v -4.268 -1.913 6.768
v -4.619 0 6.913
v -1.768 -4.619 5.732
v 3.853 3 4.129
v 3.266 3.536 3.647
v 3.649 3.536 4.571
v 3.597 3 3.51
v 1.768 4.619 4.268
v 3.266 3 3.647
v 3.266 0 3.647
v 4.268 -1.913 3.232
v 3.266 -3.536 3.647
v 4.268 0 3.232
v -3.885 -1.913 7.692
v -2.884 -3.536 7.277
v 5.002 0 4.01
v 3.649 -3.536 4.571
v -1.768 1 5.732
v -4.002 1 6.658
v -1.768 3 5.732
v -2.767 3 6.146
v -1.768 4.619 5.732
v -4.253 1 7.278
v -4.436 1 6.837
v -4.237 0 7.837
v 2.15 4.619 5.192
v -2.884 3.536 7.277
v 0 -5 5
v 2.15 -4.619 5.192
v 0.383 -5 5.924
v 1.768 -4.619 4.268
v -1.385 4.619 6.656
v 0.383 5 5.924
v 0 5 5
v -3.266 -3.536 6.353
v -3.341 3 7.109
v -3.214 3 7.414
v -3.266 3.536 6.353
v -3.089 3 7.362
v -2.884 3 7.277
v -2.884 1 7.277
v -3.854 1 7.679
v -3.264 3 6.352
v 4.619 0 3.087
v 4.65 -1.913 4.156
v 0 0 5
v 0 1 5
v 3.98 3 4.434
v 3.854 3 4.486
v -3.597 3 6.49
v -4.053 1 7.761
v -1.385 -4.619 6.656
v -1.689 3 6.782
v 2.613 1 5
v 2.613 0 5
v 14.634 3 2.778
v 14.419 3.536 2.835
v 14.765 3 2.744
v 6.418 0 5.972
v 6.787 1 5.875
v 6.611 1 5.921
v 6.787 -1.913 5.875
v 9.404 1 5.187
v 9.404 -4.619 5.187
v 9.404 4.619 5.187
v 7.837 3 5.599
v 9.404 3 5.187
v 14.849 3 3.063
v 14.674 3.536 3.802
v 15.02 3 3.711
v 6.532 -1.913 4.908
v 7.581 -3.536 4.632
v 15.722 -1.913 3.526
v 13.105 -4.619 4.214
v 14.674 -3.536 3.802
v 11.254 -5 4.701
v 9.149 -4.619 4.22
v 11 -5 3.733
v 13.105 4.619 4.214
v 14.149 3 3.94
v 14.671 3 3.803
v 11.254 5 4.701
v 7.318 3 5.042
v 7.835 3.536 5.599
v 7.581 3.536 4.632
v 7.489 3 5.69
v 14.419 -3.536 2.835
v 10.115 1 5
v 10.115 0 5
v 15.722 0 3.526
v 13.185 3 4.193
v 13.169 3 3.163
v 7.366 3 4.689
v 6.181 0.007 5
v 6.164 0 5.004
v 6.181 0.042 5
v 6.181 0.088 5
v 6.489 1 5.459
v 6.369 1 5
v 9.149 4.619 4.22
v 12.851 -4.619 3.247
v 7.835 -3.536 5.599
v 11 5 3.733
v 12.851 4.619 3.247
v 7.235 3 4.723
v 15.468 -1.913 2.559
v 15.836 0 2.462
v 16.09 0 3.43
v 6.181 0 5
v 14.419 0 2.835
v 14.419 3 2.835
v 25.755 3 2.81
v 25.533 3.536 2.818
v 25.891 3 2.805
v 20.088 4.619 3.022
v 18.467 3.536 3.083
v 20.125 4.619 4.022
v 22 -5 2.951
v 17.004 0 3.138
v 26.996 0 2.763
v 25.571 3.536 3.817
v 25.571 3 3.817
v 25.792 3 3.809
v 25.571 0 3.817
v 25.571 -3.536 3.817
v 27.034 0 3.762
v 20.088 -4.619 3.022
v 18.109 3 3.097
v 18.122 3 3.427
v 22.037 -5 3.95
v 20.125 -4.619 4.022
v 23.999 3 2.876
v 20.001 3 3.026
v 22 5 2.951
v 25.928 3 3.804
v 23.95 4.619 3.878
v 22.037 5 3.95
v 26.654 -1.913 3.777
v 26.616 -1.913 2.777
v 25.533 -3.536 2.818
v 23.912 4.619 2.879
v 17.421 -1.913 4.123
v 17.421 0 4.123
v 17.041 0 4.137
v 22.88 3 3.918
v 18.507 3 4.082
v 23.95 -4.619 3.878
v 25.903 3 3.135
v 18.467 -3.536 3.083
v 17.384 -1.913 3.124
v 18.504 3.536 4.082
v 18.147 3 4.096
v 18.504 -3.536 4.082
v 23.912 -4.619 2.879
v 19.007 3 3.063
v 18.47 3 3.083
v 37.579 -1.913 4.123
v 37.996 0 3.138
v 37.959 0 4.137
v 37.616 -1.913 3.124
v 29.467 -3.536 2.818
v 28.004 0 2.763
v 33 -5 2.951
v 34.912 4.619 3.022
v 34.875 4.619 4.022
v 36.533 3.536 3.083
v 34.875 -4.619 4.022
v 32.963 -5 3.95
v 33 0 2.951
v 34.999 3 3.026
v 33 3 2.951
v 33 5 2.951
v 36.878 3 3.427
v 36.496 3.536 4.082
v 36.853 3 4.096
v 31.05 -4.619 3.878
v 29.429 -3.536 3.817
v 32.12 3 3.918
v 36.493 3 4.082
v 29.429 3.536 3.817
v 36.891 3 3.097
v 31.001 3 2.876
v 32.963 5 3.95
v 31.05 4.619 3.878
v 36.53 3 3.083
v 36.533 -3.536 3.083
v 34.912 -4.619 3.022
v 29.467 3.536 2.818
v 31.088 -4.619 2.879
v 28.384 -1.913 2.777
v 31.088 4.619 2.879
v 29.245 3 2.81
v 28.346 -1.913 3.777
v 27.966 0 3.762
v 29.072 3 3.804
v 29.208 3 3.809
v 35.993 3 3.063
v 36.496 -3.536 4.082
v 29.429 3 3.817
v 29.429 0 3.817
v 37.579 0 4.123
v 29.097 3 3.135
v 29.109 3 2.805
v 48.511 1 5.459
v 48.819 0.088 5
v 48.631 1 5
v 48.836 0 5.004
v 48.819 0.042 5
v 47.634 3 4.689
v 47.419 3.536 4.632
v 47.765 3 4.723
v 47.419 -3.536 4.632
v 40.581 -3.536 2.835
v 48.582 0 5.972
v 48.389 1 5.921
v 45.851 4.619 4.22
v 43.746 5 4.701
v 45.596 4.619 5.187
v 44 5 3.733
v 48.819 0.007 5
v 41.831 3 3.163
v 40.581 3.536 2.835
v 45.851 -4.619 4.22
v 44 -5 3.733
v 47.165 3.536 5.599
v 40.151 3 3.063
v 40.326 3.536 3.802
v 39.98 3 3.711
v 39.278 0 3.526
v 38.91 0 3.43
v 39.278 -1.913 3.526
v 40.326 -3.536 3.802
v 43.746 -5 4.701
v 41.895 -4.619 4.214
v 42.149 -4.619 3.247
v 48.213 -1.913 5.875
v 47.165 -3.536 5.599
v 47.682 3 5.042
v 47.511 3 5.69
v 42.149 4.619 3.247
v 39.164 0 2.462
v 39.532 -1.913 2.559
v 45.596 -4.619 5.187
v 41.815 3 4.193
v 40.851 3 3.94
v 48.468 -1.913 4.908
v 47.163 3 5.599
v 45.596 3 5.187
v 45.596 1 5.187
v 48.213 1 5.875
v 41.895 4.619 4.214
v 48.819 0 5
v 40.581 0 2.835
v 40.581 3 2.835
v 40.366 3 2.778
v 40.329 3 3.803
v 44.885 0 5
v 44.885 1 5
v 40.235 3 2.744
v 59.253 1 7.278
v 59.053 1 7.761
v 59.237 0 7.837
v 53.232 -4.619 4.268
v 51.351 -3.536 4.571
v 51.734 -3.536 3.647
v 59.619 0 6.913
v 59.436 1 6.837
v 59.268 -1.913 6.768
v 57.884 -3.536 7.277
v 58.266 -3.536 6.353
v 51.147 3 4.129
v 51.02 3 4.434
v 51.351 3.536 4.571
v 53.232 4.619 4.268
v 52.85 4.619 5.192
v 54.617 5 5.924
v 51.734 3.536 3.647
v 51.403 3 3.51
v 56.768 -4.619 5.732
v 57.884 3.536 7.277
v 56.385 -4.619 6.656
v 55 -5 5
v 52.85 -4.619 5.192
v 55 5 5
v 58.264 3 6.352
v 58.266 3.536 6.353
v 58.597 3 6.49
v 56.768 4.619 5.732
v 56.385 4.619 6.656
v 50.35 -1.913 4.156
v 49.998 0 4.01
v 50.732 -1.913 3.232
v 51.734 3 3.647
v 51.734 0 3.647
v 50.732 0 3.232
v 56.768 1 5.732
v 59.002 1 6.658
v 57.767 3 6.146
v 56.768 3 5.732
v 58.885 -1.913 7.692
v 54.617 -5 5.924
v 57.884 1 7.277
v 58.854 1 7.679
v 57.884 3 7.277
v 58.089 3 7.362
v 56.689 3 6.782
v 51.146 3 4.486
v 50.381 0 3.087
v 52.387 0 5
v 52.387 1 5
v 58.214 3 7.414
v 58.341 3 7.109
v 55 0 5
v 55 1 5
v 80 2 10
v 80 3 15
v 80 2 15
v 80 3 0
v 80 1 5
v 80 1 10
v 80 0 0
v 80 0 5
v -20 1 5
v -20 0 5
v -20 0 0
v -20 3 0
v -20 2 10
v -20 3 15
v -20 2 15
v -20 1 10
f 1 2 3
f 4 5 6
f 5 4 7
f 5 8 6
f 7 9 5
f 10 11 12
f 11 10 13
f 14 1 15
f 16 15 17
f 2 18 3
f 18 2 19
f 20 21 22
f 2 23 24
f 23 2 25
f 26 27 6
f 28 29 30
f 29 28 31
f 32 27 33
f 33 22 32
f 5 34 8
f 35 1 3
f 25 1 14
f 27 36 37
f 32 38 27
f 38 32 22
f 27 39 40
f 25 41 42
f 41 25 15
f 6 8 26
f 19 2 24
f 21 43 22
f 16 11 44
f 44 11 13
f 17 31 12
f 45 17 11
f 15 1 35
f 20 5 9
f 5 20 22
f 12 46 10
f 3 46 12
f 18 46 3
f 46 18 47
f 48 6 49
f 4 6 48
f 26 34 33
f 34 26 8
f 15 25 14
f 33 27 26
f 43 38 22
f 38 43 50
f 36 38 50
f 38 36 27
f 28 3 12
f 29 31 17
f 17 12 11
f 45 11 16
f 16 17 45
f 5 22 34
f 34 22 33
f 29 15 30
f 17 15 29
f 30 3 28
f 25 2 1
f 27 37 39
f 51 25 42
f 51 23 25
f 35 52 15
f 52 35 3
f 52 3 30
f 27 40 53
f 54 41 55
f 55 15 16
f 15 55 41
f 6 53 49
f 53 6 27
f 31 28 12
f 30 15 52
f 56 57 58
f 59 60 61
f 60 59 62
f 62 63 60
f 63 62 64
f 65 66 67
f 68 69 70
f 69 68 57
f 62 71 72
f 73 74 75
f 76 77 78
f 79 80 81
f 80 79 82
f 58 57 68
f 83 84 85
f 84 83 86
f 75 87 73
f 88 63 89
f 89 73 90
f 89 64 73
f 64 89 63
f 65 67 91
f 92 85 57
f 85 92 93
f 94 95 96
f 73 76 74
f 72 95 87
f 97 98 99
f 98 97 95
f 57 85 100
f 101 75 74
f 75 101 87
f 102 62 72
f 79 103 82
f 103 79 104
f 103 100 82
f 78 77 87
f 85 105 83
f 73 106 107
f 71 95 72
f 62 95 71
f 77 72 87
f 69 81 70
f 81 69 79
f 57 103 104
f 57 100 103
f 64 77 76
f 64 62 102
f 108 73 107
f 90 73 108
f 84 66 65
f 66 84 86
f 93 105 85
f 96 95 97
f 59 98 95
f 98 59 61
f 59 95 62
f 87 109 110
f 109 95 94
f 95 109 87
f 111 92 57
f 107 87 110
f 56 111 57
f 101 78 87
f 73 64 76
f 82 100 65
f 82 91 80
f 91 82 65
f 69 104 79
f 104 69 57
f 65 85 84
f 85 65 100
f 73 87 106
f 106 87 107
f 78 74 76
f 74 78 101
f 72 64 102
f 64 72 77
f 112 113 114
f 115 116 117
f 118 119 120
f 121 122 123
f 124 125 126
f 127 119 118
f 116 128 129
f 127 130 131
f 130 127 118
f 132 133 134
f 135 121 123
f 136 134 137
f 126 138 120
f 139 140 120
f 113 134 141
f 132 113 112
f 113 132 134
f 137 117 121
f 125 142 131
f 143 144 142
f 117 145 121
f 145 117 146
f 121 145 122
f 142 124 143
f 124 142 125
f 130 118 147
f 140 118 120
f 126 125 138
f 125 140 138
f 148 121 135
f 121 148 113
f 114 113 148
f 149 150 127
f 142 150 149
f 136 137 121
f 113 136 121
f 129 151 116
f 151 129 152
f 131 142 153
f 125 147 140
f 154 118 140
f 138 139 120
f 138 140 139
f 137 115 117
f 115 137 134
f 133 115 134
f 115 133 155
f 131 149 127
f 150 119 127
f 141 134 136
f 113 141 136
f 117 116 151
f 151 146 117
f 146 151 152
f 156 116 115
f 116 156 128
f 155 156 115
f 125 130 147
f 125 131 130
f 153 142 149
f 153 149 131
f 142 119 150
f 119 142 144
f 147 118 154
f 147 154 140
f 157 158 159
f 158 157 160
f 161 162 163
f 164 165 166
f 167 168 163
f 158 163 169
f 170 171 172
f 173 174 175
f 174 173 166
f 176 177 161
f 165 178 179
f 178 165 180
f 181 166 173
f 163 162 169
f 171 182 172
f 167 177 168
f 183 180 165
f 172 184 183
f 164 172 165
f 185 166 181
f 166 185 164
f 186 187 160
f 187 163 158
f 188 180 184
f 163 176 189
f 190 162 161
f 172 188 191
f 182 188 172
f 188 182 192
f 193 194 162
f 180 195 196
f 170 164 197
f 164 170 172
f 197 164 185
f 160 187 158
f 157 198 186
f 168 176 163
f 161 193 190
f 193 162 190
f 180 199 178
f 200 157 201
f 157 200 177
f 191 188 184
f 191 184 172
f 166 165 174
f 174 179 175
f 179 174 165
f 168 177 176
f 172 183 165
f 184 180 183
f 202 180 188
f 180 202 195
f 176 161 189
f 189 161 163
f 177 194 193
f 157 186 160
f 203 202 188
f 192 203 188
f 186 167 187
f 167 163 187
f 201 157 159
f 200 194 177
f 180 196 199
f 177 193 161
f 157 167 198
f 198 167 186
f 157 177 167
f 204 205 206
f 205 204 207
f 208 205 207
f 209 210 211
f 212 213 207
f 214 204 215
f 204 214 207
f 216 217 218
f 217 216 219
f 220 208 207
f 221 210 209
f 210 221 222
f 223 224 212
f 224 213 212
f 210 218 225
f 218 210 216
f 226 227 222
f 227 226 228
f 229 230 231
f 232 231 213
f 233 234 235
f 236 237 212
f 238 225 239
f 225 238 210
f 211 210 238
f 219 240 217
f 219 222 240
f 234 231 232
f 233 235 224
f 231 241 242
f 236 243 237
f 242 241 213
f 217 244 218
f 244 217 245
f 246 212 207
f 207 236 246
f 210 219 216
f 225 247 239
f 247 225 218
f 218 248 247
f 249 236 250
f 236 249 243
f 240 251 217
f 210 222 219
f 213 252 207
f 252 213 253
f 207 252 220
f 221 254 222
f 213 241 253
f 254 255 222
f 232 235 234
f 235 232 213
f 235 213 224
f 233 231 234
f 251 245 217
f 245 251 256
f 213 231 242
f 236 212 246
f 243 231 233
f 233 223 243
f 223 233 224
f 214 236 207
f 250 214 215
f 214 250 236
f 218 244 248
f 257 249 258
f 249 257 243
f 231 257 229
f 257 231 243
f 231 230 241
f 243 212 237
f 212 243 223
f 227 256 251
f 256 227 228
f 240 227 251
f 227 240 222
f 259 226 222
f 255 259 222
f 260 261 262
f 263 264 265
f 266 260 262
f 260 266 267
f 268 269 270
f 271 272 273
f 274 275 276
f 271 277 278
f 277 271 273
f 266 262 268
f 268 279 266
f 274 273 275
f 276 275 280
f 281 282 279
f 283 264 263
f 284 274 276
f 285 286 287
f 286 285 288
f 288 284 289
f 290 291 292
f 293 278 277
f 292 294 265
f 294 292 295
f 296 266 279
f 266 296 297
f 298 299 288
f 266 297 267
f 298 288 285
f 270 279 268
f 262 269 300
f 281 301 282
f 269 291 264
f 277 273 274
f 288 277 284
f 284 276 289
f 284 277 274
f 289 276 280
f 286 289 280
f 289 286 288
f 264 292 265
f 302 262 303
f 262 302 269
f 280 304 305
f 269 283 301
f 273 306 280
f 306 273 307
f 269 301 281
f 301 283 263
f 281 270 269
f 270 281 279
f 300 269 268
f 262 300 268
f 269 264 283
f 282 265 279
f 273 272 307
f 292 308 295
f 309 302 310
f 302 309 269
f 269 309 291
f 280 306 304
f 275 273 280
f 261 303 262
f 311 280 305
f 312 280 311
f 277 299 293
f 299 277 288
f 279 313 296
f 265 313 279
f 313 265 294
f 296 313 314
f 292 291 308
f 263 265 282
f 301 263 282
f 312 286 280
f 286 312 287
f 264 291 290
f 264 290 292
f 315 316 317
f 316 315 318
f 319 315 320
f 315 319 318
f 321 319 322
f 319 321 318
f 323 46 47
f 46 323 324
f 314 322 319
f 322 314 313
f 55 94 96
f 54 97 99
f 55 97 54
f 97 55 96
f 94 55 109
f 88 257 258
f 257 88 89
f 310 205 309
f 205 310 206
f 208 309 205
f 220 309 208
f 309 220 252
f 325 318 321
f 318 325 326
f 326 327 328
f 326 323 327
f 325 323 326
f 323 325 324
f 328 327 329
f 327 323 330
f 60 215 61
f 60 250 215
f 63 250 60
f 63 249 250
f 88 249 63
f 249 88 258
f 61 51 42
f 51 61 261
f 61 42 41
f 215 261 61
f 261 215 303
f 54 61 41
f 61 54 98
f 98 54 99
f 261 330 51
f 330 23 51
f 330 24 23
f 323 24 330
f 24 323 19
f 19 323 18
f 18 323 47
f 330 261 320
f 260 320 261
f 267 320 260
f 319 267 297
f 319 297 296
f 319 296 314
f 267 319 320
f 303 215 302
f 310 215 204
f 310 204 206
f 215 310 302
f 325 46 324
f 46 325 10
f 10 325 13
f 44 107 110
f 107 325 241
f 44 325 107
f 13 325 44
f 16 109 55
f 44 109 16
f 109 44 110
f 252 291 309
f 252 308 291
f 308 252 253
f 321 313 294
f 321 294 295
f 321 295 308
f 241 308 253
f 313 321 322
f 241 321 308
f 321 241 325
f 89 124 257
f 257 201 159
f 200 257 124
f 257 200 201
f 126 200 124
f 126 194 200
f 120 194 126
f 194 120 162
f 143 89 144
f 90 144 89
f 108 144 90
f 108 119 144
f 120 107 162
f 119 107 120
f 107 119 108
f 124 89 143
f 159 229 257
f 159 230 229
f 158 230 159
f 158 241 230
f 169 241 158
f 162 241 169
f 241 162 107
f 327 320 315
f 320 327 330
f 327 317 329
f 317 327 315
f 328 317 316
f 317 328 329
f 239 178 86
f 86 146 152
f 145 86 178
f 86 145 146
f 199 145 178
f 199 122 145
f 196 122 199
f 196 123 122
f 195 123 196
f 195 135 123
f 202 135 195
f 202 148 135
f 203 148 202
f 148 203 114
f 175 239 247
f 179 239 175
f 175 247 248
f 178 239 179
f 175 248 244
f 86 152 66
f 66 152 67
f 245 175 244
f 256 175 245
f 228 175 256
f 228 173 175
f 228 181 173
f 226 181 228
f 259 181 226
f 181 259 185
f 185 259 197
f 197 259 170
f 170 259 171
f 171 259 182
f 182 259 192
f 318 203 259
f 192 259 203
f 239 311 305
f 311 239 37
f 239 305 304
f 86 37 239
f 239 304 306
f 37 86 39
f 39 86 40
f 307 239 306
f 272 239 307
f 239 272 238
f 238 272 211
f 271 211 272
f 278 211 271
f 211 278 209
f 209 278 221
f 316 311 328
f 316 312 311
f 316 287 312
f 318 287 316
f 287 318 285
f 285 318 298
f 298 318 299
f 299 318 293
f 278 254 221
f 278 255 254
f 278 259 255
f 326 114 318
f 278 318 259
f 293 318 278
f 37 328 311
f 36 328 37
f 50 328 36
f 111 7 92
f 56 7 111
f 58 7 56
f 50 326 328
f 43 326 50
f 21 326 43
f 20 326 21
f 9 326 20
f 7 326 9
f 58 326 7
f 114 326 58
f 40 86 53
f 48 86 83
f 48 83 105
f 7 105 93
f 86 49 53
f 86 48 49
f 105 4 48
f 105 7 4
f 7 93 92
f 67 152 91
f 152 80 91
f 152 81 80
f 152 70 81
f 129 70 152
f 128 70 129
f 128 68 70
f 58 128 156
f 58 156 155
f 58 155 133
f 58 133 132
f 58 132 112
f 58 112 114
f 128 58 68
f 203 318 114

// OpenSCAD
slices=6;
height=5;
sweep_angle=45;
height_min=(height+2*height*pow(cos(sweep_angle),3))/3;
height_swing=height-height_min;
width=10;

sweep_shift=45;


for (i=[0:slices-1]) {
    sweep_slice = (180)/(slices-1)*i;
    pre_sweep = cos(sweep_slice);
    height_slice = (180)/(slices-1)*i;
    sweep_factor = pre_sweep*abs(pre_sweep);
    
    translate([width*1.1*i, 0, 0])
    translate([0, 0, height-height_swing*abs(sin(height_slice))])
    rotate([0, sweep_angle*sweep_factor*0.5, 0])
    cylinder(h=1, d=width);
    
}
translate([-20, 0, 0]) {
    cube([100, 1, 5]);
    translate([0, 1, 0])
    cube([100, 1, 10]);
    translate([0, 2, 0])
    cube([100, 1, 15]);
}
